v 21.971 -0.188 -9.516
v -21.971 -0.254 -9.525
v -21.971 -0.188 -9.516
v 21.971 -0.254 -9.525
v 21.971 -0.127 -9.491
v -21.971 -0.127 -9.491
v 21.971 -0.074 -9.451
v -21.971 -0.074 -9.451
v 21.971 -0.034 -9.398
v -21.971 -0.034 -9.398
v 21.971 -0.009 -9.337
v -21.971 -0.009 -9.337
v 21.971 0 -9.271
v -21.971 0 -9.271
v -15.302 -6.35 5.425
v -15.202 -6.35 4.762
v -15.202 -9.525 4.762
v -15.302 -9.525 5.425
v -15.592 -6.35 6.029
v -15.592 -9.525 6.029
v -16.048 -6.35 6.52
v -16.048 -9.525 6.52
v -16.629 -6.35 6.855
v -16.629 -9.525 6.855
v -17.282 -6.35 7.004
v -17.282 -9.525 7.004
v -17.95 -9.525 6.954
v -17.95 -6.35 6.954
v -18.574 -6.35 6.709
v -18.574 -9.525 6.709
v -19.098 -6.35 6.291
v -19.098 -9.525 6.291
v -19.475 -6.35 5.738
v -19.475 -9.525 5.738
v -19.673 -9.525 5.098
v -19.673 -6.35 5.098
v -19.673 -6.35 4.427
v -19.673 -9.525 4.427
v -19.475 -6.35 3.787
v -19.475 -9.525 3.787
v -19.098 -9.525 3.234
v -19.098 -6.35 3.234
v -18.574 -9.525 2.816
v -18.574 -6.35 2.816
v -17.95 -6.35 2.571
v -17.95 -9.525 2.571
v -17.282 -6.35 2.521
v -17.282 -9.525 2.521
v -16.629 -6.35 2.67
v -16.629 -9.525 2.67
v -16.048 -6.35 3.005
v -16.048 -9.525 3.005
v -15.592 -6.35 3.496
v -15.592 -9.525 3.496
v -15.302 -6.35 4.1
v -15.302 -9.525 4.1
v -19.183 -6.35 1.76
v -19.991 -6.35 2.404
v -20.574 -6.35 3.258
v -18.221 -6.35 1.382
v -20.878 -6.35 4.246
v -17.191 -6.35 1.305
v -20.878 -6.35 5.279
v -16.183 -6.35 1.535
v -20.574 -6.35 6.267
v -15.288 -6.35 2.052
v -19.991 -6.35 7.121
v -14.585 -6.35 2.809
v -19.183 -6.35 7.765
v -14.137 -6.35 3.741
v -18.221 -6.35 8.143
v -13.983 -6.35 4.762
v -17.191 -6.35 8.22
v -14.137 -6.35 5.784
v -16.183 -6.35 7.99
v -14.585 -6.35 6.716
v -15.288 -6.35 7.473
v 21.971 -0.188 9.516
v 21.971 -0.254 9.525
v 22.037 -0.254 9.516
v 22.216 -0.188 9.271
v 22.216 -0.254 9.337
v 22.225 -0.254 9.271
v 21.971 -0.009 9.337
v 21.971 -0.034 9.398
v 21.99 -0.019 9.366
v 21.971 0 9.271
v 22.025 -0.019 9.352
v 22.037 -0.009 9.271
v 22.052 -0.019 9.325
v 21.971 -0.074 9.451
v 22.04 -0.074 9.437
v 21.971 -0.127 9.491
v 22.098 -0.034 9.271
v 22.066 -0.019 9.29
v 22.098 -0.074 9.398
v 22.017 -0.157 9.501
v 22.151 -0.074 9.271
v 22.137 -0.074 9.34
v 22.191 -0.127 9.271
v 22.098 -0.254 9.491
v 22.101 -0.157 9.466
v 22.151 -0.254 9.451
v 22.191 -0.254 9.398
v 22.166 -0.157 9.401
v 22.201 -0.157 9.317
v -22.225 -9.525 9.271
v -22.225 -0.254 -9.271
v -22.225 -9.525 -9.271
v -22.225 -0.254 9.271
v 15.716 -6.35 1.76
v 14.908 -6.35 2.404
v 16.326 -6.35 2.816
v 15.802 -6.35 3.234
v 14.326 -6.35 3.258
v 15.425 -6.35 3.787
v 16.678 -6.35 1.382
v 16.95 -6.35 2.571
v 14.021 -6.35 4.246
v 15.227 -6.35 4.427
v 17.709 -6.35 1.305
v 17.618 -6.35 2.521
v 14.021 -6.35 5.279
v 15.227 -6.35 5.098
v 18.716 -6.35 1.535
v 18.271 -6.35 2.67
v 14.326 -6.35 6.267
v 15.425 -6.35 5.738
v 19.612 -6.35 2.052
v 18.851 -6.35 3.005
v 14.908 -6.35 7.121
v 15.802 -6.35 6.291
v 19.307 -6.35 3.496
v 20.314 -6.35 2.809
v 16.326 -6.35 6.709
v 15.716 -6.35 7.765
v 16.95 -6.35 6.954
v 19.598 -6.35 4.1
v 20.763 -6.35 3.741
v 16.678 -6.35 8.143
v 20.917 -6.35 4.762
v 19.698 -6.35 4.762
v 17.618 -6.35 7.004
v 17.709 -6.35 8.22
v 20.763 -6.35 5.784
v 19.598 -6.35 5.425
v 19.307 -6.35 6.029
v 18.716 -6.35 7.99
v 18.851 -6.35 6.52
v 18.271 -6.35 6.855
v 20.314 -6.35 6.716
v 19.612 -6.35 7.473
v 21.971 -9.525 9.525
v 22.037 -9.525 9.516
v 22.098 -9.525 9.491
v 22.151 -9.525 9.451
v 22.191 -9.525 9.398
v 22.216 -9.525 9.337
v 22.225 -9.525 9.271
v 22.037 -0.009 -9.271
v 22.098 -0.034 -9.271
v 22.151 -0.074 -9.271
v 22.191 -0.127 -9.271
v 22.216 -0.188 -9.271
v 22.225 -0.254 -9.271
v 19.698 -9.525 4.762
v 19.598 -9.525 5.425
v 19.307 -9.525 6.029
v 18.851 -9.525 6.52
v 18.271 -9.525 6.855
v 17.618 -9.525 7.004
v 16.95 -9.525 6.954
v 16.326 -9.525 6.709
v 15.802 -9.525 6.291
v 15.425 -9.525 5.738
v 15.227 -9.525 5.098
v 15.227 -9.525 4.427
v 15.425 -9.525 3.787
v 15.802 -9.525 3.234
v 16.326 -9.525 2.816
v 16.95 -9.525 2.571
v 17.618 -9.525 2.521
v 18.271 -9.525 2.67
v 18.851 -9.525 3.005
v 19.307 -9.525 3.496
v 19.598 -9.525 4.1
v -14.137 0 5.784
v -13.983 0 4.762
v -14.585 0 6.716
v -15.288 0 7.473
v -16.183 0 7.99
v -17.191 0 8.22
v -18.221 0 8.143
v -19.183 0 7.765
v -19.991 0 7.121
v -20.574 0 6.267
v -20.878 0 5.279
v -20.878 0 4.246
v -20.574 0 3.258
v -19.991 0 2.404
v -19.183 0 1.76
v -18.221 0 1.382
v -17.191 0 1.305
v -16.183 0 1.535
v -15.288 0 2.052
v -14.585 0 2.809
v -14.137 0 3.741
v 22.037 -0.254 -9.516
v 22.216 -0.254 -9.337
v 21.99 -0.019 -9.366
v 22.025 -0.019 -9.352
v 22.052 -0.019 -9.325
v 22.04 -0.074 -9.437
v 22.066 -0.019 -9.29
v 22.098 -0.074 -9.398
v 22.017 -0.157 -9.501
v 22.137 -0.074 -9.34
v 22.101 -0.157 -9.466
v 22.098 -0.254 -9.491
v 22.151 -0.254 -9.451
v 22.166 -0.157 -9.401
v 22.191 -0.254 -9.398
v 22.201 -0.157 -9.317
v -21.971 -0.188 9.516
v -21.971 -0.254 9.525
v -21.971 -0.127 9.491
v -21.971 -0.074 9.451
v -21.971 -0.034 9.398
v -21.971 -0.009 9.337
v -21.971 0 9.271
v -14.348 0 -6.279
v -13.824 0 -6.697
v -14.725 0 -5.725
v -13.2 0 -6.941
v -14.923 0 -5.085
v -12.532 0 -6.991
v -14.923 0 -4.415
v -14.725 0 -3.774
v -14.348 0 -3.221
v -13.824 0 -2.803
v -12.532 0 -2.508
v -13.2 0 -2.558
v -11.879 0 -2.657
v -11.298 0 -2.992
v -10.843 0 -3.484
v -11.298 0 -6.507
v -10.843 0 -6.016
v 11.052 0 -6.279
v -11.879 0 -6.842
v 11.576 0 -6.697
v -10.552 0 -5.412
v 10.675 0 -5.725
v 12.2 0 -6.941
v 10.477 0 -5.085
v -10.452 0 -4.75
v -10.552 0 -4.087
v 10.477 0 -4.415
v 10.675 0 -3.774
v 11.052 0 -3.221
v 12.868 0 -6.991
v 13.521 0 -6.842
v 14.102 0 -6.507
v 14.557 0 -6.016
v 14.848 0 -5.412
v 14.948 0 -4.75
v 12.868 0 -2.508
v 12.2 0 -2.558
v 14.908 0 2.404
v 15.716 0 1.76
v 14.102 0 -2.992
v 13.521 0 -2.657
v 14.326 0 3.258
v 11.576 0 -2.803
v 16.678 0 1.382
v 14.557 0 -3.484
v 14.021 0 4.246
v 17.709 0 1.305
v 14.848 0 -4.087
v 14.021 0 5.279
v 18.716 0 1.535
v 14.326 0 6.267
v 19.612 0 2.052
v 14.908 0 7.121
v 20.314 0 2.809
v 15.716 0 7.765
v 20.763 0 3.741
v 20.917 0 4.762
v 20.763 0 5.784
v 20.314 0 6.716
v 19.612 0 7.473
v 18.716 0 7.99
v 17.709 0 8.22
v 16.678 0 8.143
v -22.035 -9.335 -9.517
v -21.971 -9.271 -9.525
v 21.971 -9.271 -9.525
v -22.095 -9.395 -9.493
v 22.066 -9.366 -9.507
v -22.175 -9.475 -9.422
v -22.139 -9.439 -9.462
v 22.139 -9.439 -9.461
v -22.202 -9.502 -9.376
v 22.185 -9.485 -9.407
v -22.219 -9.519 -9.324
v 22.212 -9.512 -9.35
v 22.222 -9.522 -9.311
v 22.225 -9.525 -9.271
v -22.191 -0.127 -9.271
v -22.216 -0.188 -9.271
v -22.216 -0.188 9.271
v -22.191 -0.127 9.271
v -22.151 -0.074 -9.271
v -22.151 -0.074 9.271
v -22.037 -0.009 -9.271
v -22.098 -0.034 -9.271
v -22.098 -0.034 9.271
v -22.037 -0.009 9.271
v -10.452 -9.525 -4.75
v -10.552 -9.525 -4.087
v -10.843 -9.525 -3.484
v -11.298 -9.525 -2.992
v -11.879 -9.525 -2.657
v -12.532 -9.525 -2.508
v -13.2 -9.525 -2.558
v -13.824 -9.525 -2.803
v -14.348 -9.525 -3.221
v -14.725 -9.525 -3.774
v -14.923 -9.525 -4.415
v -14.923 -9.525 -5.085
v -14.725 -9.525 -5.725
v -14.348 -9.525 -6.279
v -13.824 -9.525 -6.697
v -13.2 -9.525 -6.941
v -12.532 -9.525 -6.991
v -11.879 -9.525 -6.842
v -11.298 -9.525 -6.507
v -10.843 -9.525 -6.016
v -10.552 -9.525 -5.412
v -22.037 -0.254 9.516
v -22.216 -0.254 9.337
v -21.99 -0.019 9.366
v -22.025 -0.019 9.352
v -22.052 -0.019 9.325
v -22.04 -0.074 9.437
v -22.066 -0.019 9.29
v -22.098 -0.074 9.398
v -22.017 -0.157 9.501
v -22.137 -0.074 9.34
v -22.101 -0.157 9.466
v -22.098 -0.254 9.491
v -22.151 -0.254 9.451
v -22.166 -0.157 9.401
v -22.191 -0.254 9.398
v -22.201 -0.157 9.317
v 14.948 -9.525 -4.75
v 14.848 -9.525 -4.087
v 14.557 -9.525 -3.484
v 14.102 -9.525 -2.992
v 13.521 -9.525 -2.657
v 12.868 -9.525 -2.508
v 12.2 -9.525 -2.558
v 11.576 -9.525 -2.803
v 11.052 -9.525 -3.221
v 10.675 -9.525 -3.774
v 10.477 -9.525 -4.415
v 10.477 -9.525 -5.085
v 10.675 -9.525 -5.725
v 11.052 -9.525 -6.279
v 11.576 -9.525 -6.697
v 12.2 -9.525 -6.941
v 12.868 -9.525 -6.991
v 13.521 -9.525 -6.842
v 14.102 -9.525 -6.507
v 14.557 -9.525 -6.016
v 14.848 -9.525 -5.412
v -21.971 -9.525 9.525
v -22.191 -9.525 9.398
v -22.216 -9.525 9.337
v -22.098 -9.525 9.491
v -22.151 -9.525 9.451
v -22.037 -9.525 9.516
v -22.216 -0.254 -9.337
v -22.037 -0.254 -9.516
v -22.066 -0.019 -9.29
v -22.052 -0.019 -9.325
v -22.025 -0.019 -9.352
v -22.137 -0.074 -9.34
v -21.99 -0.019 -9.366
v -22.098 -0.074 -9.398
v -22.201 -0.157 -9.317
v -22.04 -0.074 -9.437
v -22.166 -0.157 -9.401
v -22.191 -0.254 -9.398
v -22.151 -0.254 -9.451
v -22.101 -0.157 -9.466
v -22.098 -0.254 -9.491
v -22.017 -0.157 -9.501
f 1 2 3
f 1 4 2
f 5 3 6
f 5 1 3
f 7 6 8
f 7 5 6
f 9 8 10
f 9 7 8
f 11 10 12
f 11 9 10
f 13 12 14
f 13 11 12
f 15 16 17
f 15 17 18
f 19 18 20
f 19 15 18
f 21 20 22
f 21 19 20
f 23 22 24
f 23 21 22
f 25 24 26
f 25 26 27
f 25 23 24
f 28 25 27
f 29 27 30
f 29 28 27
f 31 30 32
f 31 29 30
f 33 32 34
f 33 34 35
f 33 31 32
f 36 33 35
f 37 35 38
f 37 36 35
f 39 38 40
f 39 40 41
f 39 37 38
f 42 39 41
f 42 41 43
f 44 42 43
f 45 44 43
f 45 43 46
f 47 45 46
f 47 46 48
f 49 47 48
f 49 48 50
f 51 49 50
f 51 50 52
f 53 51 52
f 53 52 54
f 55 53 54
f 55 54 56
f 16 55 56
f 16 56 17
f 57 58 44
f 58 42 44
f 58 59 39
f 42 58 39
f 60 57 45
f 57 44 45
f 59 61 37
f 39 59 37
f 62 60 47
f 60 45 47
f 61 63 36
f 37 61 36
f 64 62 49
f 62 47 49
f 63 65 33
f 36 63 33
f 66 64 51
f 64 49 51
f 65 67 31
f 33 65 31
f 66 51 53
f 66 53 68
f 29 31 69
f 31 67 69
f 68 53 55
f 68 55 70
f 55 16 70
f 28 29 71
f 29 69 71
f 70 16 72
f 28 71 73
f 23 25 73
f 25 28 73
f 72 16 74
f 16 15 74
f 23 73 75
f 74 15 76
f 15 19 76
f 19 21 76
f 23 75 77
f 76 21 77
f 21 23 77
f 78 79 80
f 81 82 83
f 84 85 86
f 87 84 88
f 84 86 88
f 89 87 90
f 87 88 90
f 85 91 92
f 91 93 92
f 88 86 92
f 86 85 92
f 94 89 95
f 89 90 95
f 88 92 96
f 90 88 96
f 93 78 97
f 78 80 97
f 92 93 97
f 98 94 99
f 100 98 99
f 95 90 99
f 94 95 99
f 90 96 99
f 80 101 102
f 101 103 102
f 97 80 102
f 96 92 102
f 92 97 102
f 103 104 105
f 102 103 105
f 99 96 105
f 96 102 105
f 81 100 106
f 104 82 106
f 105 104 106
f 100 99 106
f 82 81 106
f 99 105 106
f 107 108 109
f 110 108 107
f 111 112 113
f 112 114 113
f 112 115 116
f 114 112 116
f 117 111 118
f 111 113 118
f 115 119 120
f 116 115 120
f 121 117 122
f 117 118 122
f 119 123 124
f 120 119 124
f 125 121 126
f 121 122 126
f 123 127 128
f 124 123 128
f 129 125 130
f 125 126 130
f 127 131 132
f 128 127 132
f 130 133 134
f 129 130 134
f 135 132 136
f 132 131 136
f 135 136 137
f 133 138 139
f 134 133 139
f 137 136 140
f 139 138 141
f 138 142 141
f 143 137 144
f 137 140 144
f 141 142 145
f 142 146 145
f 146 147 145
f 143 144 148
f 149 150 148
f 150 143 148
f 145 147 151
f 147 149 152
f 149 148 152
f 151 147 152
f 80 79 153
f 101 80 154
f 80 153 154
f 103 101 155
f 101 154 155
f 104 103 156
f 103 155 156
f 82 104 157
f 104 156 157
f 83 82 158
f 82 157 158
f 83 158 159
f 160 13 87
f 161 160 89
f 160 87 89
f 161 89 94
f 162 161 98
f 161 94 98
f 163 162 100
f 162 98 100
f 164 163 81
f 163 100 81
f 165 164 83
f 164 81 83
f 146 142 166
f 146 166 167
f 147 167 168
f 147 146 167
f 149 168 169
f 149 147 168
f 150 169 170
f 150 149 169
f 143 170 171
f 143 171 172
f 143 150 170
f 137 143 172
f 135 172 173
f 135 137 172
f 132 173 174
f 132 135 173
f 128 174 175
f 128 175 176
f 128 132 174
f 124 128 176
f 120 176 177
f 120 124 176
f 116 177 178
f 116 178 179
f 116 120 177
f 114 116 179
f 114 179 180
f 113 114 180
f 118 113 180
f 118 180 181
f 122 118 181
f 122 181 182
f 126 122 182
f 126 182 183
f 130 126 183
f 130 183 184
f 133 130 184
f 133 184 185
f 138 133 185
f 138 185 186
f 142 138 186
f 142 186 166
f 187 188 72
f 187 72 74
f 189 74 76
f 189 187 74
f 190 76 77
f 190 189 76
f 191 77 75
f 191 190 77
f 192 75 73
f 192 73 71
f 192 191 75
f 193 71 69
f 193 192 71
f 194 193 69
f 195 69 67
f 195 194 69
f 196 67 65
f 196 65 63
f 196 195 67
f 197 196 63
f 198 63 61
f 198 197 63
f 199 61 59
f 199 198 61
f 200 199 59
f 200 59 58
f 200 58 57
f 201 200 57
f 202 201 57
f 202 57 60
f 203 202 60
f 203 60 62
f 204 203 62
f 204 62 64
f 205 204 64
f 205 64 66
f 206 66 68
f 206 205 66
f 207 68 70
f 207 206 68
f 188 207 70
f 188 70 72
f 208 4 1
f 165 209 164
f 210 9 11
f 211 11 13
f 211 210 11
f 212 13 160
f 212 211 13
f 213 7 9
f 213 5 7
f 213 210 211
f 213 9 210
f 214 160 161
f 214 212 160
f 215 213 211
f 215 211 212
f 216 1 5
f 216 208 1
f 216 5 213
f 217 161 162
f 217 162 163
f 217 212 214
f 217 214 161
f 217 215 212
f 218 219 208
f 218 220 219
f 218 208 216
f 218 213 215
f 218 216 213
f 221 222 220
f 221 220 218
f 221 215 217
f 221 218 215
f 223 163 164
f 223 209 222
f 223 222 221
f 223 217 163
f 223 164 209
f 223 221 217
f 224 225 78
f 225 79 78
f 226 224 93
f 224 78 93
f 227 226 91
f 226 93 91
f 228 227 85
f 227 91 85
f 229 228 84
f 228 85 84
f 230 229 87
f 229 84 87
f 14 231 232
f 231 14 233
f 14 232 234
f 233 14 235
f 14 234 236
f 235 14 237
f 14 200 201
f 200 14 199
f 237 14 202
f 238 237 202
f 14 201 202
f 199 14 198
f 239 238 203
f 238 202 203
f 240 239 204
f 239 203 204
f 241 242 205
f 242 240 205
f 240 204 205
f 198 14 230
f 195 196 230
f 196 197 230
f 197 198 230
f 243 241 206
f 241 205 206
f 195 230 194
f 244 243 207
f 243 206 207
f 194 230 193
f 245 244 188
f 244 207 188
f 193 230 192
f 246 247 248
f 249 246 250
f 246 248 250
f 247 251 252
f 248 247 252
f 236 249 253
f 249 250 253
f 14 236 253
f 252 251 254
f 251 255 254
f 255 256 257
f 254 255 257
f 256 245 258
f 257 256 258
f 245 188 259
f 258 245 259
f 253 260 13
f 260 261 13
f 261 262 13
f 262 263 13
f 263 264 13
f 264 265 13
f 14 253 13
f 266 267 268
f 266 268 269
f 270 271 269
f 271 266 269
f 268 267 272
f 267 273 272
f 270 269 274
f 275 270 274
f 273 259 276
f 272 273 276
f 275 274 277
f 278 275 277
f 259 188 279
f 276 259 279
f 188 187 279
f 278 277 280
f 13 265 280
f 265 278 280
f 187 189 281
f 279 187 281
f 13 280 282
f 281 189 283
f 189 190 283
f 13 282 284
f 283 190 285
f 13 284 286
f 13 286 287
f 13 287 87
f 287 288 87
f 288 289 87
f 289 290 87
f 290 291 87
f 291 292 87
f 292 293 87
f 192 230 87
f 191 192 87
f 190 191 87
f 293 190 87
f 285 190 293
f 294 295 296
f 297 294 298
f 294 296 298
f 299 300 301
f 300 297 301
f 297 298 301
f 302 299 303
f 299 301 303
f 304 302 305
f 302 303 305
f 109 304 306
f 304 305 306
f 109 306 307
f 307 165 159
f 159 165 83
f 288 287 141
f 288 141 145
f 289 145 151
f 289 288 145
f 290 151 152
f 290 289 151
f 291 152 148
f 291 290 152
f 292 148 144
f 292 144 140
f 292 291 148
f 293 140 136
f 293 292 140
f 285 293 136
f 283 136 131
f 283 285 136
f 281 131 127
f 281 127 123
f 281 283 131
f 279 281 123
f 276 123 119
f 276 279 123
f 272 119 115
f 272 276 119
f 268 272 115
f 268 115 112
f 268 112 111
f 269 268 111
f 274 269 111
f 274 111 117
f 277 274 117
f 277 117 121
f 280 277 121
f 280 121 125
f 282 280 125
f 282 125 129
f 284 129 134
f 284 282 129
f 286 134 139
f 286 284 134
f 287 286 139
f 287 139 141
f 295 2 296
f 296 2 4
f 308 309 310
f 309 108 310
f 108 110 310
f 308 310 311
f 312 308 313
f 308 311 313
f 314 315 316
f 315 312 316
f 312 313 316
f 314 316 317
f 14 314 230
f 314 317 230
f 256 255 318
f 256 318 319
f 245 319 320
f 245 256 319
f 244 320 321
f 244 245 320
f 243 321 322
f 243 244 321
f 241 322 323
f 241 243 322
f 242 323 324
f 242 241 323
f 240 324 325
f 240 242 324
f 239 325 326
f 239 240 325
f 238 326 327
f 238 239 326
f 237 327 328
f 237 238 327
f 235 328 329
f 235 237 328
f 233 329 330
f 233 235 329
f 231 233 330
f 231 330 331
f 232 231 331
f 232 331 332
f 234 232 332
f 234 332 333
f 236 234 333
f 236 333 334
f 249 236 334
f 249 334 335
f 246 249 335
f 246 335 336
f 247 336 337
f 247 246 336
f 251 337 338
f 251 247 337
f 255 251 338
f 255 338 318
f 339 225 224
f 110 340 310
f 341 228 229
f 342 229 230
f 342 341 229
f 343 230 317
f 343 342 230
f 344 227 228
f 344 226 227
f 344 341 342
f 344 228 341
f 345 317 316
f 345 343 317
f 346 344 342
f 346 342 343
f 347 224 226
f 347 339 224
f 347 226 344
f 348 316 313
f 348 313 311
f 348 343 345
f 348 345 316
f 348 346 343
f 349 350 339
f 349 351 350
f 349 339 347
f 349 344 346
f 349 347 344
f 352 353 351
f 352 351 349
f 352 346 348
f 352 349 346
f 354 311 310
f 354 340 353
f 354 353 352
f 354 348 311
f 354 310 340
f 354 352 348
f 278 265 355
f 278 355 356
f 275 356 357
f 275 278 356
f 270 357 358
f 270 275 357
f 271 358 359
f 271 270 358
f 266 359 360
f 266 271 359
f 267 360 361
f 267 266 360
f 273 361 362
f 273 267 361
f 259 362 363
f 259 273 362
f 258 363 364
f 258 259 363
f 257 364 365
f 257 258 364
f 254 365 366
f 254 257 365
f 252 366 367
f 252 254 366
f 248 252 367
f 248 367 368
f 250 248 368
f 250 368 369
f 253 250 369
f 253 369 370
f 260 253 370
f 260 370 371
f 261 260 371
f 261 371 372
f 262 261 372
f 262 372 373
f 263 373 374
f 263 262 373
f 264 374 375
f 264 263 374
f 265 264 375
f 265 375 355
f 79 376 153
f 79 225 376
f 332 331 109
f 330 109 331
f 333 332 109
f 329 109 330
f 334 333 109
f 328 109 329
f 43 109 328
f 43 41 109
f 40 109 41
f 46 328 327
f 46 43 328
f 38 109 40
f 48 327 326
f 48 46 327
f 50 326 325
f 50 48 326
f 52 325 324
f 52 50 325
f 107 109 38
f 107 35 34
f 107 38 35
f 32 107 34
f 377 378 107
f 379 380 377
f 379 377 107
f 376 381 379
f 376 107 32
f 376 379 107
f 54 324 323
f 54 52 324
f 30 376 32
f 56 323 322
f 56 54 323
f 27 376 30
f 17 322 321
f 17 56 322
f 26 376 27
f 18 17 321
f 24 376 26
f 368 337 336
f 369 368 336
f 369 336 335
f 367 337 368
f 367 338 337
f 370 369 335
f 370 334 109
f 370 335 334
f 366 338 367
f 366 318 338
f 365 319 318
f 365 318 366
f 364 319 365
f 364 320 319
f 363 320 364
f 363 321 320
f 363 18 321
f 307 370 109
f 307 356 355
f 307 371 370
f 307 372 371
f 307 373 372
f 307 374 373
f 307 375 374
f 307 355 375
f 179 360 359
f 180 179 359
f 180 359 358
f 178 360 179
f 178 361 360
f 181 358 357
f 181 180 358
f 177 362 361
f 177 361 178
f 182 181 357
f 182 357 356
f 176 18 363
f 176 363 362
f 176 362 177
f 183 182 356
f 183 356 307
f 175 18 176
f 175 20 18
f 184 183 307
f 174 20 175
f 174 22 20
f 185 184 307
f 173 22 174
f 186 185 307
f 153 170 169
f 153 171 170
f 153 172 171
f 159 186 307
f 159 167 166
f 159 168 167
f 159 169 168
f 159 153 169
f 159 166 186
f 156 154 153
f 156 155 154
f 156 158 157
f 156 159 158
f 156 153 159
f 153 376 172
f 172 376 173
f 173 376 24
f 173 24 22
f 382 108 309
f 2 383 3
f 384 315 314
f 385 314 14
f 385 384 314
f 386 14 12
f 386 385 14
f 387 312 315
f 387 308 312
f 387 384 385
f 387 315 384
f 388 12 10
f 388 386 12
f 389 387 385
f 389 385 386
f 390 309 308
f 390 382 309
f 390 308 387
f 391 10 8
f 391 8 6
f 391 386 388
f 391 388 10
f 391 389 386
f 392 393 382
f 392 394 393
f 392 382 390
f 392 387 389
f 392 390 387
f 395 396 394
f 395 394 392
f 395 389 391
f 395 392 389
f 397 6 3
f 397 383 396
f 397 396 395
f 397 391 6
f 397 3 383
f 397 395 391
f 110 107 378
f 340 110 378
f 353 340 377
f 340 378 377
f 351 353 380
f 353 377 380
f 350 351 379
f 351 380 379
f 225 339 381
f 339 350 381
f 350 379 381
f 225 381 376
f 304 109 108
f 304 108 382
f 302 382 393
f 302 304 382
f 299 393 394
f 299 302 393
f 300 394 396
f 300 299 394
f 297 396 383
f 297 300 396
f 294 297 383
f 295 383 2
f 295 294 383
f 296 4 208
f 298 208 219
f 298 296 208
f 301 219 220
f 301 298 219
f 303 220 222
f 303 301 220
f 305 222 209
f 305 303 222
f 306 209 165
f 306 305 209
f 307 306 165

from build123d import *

# Parameters (mm, degrees)
F0_W     = 44.45
F0_H     = 19.05
F0_R     = 2.2479
F0_R_2   = 3.4671
F1_DEPTH = 9.525
F2_DEPTH = 6.35
F3_R     = 0.254


with BuildPart() as f1:
    # F0 (on Front) → F1 (new body)
    with BuildSketch(Plane.XZ):
        Rectangle(F0_W, F0_H)
        with Locations((-12.7, -4.7498)):
            Circle(F0_R, mode=Mode.SUBTRACT)
        with Locations((12.7, -4.7498)):
            Circle(F0_R, mode=Mode.SUBTRACT)
        with Locations((-17.4498, 4.7625)):
            Circle(F0_R_2, mode=Mode.SUBTRACT)
        with Locations((17.4498, 4.7625)):
            Circle(F0_R_2, mode=Mode.SUBTRACT)
        with Locations((17.4498, 4.7625)):
            Circle(F0_R_2)
        with Locations((17.4498, 4.7625)):
            Circle(F0_R, mode=Mode.SUBTRACT)
        with Locations((-17.4498, 4.7625)):
            Circle(F0_R_2)
        with Locations((-17.4498, 4.7625)):
            Circle(F0_R, mode=Mode.SUBTRACT)
    extrude(amount=F1_DEPTH)

    # F0 (on Front) → F2 (cut)
    with BuildSketch(Plane.XZ):
        with Locations((17.4498, 4.7625)):
            Circle(F0_R_2)
        with Locations((17.4498, 4.7625)):
            Circle(F0_R, mode=Mode.SUBTRACT)
        with Locations((-17.4498, 4.7625)):
            Circle(F0_R_2)
        with Locations((-17.4498, 4.7625)):
            Circle(F0_R, mode=Mode.SUBTRACT)
    extrude(amount=F2_DEPTH, mode=Mode.SUBTRACT)

    # F3
    f3_edges = [f1.edges().sort_by_distance(p)[0] for p in [
        (-22.225, -4.7625, 9.525),
        (-22.225, -4.7625, -9.525),
        (22.225, -4.7625, -9.525),
        (22.225, -4.7625, 9.525),
        (0, 0, 9.525),
        (-22.225, 0, 0),
        (0, 0, -9.525),
        (22.225, 0, 0),
        (0, -9.525, -9.525),
    ]]
    fillet(f3_edges, radius=F3_R)


solid = f1.part
